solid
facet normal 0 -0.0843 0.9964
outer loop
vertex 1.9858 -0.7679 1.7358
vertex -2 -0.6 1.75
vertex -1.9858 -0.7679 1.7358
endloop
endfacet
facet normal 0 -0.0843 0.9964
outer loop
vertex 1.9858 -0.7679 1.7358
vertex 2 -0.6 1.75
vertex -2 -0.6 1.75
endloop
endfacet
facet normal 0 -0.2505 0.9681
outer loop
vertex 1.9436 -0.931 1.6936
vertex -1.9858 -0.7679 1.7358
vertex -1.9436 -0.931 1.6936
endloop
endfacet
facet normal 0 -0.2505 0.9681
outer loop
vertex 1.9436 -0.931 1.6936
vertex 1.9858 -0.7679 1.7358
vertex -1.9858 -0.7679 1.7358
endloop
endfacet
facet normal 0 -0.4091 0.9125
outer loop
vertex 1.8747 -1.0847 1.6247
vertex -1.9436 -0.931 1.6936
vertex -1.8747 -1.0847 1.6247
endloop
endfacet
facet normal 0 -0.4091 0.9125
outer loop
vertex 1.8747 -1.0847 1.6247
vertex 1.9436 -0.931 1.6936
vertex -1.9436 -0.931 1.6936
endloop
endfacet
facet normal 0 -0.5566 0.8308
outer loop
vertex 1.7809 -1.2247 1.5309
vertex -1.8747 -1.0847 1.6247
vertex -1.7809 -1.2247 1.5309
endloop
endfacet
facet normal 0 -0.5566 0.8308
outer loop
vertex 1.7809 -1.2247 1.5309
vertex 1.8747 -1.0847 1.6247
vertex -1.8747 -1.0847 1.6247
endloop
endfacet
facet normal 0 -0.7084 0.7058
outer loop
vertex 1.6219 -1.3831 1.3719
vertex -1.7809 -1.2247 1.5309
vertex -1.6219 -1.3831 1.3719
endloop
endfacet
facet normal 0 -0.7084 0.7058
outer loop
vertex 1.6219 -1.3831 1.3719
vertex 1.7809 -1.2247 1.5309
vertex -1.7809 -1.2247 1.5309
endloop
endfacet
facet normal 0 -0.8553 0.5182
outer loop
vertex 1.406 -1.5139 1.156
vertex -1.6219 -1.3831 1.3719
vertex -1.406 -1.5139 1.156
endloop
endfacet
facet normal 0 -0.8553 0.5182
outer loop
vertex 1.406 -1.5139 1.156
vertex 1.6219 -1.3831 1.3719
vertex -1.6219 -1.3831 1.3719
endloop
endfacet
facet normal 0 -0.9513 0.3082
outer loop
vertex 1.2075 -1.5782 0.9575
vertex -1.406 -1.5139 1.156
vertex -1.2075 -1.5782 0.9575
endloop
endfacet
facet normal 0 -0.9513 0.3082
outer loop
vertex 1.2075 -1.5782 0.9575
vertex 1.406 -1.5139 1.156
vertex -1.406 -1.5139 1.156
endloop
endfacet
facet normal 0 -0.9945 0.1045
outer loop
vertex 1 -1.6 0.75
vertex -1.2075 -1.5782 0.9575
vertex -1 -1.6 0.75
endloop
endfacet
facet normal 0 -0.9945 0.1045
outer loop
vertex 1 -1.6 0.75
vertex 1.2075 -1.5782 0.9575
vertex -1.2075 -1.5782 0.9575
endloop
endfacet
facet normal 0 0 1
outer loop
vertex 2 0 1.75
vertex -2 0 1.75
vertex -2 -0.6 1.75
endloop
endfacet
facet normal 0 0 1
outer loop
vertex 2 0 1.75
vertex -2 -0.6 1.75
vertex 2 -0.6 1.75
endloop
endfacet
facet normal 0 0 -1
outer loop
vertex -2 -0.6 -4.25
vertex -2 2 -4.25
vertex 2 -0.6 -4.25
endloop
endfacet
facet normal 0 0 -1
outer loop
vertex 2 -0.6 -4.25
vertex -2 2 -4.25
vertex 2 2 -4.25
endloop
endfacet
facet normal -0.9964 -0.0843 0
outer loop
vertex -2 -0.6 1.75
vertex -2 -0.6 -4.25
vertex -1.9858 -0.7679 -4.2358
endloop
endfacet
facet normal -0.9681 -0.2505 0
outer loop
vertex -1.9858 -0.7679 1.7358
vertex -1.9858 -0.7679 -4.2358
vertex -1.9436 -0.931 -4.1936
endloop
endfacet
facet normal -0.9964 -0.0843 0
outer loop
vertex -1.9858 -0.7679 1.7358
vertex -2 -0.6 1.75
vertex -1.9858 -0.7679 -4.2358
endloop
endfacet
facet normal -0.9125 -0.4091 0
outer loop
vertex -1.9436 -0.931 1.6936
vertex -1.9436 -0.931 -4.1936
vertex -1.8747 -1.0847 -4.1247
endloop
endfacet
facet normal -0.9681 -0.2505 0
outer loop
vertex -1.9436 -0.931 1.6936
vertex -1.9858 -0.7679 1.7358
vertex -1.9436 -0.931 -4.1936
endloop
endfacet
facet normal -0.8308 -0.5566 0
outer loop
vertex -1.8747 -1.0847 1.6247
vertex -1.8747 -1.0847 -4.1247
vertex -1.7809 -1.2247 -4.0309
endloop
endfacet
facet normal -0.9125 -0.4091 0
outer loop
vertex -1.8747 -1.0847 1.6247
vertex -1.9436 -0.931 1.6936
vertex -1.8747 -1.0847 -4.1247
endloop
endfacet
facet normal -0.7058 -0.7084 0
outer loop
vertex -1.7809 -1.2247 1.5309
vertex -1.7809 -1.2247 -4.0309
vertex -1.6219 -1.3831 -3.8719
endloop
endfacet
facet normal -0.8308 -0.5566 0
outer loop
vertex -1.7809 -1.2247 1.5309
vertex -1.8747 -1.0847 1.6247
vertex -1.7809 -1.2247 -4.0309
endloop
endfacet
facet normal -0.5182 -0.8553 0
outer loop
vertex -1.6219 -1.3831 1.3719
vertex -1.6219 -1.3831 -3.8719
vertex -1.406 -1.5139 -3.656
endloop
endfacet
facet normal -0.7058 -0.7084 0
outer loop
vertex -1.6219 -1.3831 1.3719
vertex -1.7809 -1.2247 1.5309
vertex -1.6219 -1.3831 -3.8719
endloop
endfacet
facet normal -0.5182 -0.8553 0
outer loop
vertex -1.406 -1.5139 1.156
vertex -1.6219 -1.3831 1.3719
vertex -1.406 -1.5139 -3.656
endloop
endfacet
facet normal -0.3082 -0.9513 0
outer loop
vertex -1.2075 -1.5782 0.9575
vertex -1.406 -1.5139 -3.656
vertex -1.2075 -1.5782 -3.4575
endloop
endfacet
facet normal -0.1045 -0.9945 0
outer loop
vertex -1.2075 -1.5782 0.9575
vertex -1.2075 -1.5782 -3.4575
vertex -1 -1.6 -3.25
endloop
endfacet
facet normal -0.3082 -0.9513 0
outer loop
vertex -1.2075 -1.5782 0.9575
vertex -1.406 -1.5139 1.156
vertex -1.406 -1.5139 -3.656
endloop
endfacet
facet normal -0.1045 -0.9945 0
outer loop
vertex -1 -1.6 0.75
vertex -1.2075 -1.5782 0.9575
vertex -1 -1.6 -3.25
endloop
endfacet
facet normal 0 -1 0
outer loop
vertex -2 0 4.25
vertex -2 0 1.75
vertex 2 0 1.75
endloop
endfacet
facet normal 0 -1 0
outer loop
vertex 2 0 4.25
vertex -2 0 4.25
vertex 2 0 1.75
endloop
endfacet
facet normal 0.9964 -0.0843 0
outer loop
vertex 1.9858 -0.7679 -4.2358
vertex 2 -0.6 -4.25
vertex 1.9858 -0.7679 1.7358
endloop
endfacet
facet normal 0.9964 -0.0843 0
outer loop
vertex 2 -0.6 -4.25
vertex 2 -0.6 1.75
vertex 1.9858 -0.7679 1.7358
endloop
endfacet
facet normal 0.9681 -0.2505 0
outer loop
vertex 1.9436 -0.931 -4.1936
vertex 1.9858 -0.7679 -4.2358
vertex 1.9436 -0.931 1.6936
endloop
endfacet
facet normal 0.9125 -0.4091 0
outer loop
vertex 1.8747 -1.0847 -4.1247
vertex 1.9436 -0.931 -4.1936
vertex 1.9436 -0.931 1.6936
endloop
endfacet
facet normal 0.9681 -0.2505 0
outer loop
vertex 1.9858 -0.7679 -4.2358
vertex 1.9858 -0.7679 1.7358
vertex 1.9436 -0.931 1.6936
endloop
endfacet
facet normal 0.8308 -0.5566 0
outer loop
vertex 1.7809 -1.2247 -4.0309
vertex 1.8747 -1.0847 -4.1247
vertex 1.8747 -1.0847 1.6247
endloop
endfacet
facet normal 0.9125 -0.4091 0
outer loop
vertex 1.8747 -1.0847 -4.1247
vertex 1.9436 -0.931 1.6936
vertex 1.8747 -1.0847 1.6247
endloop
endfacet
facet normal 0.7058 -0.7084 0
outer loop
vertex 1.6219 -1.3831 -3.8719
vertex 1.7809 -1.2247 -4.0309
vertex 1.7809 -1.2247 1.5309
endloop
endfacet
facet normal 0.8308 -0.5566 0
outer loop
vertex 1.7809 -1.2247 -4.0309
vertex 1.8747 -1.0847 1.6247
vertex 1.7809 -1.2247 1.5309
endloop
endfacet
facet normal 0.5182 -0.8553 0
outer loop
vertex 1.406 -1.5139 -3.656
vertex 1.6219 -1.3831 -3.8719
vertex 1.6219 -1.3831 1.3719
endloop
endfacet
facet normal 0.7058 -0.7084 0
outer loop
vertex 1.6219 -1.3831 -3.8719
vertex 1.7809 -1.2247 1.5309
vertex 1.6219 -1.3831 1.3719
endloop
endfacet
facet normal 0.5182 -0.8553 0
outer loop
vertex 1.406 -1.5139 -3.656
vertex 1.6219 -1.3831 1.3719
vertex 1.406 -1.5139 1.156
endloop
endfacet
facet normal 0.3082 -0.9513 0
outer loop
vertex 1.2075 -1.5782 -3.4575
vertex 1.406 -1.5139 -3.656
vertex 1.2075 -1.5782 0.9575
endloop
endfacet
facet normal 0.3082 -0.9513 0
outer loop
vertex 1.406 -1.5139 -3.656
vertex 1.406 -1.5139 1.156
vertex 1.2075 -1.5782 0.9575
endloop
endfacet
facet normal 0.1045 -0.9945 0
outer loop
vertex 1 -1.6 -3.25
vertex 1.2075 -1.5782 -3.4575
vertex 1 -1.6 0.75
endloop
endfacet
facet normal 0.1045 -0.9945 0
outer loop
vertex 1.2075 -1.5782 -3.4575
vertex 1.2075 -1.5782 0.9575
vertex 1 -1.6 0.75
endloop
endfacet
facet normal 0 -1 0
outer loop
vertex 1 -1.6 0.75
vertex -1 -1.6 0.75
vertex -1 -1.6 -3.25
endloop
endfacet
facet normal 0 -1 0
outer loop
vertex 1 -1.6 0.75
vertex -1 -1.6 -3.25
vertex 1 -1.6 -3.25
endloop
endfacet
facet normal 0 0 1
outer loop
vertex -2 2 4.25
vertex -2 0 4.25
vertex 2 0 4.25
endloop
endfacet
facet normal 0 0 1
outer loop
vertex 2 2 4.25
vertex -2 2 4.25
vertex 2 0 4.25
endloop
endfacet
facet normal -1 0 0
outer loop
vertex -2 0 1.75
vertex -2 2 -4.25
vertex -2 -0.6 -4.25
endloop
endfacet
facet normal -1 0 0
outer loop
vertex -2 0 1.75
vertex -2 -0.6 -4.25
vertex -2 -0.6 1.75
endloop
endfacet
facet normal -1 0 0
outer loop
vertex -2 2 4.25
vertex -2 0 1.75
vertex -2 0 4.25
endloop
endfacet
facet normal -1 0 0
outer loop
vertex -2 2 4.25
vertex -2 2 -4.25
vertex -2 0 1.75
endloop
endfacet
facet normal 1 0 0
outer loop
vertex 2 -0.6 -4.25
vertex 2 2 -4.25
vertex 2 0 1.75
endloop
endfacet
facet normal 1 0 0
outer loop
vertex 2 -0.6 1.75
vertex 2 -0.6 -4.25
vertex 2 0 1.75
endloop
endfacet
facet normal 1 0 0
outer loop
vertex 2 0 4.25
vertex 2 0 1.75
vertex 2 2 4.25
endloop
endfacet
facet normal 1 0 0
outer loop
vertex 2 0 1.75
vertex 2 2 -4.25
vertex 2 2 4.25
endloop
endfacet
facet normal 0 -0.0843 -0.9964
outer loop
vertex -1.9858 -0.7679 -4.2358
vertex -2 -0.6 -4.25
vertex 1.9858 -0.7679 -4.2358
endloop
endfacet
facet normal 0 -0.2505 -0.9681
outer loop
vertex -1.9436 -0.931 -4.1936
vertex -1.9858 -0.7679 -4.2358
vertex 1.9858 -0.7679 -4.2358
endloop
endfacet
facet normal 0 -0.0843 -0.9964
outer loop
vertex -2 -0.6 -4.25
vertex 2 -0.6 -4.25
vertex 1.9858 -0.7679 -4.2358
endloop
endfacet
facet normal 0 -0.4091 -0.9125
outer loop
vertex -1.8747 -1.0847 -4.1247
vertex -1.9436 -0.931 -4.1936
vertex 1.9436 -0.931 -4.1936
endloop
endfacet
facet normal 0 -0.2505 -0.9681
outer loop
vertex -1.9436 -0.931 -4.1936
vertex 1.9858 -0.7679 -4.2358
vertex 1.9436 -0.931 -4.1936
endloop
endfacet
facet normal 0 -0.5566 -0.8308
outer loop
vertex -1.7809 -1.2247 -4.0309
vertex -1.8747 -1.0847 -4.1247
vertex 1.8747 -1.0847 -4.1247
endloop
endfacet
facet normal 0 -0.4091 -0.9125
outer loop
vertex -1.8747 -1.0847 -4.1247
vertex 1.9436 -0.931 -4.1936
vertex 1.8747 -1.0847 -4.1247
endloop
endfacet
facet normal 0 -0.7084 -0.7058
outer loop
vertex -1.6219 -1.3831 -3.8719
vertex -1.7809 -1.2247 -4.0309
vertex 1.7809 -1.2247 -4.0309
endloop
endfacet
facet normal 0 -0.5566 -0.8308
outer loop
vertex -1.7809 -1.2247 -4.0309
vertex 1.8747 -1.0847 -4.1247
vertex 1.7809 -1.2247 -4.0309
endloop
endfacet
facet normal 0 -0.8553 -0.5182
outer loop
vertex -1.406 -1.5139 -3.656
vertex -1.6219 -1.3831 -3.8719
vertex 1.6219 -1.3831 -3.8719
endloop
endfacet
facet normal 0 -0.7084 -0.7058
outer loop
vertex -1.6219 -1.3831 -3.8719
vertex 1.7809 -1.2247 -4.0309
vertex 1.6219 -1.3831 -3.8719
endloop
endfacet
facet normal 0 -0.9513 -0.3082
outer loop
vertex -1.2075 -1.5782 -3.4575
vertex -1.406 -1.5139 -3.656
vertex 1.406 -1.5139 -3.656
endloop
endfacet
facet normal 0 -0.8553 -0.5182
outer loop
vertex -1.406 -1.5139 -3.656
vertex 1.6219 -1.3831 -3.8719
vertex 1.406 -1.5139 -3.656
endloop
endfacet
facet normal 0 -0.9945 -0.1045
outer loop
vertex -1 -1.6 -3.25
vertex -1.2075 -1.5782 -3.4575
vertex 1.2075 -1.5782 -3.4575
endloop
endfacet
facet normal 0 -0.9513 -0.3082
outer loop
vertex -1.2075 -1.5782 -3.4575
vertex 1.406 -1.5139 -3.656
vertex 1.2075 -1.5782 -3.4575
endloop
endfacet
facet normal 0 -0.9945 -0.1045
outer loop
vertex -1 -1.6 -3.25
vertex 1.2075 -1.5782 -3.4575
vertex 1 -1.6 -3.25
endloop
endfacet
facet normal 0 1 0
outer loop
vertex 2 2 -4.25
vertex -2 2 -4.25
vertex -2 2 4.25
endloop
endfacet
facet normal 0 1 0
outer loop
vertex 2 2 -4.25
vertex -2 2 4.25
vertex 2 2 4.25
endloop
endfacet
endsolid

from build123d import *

# Parameters (mm, degrees)
SKETCH2_W           = 4
SKETCH2_H           = 8.5
BOSS_EXTRUDE1_DEPTH = 2
SKETCH3_W           = 4
SKETCH3_H           = 6
BOSS_EXTRUDE2_DEPTH = 1.6
FILLET1_R           = 1


with BuildPart() as part:
    # Sketch2 → Boss-Extrude1 (new body)
    with BuildSketch(Plane(origin=(0, 0, 0), x_dir=(1, 0, 0), z_dir=(0, 1, 0))):
        Rectangle(SKETCH2_W, SKETCH2_H)
    extrude(amount=BOSS_EXTRUDE1_DEPTH)

    # Sketch3 → Boss-Extrude2 (add)
    with BuildSketch(Plane.XZ):
        with Locations((0, -1.25)):
            Rectangle(SKETCH3_W, SKETCH3_H)
    extrude(amount=BOSS_EXTRUDE2_DEPTH)

    # Fillet1
    fillet1_edges = [part.edges().sort_by_distance(p)[0] for p in [
        (-2, -1.6, -1.25),
        (0, -1.6, -4.25),
        (2, -1.6, -1.25),
        (0, -1.6, 1.75),
    ]]
    fillet(fillet1_edges, radius=FILLET1_R)


solid = part.part
